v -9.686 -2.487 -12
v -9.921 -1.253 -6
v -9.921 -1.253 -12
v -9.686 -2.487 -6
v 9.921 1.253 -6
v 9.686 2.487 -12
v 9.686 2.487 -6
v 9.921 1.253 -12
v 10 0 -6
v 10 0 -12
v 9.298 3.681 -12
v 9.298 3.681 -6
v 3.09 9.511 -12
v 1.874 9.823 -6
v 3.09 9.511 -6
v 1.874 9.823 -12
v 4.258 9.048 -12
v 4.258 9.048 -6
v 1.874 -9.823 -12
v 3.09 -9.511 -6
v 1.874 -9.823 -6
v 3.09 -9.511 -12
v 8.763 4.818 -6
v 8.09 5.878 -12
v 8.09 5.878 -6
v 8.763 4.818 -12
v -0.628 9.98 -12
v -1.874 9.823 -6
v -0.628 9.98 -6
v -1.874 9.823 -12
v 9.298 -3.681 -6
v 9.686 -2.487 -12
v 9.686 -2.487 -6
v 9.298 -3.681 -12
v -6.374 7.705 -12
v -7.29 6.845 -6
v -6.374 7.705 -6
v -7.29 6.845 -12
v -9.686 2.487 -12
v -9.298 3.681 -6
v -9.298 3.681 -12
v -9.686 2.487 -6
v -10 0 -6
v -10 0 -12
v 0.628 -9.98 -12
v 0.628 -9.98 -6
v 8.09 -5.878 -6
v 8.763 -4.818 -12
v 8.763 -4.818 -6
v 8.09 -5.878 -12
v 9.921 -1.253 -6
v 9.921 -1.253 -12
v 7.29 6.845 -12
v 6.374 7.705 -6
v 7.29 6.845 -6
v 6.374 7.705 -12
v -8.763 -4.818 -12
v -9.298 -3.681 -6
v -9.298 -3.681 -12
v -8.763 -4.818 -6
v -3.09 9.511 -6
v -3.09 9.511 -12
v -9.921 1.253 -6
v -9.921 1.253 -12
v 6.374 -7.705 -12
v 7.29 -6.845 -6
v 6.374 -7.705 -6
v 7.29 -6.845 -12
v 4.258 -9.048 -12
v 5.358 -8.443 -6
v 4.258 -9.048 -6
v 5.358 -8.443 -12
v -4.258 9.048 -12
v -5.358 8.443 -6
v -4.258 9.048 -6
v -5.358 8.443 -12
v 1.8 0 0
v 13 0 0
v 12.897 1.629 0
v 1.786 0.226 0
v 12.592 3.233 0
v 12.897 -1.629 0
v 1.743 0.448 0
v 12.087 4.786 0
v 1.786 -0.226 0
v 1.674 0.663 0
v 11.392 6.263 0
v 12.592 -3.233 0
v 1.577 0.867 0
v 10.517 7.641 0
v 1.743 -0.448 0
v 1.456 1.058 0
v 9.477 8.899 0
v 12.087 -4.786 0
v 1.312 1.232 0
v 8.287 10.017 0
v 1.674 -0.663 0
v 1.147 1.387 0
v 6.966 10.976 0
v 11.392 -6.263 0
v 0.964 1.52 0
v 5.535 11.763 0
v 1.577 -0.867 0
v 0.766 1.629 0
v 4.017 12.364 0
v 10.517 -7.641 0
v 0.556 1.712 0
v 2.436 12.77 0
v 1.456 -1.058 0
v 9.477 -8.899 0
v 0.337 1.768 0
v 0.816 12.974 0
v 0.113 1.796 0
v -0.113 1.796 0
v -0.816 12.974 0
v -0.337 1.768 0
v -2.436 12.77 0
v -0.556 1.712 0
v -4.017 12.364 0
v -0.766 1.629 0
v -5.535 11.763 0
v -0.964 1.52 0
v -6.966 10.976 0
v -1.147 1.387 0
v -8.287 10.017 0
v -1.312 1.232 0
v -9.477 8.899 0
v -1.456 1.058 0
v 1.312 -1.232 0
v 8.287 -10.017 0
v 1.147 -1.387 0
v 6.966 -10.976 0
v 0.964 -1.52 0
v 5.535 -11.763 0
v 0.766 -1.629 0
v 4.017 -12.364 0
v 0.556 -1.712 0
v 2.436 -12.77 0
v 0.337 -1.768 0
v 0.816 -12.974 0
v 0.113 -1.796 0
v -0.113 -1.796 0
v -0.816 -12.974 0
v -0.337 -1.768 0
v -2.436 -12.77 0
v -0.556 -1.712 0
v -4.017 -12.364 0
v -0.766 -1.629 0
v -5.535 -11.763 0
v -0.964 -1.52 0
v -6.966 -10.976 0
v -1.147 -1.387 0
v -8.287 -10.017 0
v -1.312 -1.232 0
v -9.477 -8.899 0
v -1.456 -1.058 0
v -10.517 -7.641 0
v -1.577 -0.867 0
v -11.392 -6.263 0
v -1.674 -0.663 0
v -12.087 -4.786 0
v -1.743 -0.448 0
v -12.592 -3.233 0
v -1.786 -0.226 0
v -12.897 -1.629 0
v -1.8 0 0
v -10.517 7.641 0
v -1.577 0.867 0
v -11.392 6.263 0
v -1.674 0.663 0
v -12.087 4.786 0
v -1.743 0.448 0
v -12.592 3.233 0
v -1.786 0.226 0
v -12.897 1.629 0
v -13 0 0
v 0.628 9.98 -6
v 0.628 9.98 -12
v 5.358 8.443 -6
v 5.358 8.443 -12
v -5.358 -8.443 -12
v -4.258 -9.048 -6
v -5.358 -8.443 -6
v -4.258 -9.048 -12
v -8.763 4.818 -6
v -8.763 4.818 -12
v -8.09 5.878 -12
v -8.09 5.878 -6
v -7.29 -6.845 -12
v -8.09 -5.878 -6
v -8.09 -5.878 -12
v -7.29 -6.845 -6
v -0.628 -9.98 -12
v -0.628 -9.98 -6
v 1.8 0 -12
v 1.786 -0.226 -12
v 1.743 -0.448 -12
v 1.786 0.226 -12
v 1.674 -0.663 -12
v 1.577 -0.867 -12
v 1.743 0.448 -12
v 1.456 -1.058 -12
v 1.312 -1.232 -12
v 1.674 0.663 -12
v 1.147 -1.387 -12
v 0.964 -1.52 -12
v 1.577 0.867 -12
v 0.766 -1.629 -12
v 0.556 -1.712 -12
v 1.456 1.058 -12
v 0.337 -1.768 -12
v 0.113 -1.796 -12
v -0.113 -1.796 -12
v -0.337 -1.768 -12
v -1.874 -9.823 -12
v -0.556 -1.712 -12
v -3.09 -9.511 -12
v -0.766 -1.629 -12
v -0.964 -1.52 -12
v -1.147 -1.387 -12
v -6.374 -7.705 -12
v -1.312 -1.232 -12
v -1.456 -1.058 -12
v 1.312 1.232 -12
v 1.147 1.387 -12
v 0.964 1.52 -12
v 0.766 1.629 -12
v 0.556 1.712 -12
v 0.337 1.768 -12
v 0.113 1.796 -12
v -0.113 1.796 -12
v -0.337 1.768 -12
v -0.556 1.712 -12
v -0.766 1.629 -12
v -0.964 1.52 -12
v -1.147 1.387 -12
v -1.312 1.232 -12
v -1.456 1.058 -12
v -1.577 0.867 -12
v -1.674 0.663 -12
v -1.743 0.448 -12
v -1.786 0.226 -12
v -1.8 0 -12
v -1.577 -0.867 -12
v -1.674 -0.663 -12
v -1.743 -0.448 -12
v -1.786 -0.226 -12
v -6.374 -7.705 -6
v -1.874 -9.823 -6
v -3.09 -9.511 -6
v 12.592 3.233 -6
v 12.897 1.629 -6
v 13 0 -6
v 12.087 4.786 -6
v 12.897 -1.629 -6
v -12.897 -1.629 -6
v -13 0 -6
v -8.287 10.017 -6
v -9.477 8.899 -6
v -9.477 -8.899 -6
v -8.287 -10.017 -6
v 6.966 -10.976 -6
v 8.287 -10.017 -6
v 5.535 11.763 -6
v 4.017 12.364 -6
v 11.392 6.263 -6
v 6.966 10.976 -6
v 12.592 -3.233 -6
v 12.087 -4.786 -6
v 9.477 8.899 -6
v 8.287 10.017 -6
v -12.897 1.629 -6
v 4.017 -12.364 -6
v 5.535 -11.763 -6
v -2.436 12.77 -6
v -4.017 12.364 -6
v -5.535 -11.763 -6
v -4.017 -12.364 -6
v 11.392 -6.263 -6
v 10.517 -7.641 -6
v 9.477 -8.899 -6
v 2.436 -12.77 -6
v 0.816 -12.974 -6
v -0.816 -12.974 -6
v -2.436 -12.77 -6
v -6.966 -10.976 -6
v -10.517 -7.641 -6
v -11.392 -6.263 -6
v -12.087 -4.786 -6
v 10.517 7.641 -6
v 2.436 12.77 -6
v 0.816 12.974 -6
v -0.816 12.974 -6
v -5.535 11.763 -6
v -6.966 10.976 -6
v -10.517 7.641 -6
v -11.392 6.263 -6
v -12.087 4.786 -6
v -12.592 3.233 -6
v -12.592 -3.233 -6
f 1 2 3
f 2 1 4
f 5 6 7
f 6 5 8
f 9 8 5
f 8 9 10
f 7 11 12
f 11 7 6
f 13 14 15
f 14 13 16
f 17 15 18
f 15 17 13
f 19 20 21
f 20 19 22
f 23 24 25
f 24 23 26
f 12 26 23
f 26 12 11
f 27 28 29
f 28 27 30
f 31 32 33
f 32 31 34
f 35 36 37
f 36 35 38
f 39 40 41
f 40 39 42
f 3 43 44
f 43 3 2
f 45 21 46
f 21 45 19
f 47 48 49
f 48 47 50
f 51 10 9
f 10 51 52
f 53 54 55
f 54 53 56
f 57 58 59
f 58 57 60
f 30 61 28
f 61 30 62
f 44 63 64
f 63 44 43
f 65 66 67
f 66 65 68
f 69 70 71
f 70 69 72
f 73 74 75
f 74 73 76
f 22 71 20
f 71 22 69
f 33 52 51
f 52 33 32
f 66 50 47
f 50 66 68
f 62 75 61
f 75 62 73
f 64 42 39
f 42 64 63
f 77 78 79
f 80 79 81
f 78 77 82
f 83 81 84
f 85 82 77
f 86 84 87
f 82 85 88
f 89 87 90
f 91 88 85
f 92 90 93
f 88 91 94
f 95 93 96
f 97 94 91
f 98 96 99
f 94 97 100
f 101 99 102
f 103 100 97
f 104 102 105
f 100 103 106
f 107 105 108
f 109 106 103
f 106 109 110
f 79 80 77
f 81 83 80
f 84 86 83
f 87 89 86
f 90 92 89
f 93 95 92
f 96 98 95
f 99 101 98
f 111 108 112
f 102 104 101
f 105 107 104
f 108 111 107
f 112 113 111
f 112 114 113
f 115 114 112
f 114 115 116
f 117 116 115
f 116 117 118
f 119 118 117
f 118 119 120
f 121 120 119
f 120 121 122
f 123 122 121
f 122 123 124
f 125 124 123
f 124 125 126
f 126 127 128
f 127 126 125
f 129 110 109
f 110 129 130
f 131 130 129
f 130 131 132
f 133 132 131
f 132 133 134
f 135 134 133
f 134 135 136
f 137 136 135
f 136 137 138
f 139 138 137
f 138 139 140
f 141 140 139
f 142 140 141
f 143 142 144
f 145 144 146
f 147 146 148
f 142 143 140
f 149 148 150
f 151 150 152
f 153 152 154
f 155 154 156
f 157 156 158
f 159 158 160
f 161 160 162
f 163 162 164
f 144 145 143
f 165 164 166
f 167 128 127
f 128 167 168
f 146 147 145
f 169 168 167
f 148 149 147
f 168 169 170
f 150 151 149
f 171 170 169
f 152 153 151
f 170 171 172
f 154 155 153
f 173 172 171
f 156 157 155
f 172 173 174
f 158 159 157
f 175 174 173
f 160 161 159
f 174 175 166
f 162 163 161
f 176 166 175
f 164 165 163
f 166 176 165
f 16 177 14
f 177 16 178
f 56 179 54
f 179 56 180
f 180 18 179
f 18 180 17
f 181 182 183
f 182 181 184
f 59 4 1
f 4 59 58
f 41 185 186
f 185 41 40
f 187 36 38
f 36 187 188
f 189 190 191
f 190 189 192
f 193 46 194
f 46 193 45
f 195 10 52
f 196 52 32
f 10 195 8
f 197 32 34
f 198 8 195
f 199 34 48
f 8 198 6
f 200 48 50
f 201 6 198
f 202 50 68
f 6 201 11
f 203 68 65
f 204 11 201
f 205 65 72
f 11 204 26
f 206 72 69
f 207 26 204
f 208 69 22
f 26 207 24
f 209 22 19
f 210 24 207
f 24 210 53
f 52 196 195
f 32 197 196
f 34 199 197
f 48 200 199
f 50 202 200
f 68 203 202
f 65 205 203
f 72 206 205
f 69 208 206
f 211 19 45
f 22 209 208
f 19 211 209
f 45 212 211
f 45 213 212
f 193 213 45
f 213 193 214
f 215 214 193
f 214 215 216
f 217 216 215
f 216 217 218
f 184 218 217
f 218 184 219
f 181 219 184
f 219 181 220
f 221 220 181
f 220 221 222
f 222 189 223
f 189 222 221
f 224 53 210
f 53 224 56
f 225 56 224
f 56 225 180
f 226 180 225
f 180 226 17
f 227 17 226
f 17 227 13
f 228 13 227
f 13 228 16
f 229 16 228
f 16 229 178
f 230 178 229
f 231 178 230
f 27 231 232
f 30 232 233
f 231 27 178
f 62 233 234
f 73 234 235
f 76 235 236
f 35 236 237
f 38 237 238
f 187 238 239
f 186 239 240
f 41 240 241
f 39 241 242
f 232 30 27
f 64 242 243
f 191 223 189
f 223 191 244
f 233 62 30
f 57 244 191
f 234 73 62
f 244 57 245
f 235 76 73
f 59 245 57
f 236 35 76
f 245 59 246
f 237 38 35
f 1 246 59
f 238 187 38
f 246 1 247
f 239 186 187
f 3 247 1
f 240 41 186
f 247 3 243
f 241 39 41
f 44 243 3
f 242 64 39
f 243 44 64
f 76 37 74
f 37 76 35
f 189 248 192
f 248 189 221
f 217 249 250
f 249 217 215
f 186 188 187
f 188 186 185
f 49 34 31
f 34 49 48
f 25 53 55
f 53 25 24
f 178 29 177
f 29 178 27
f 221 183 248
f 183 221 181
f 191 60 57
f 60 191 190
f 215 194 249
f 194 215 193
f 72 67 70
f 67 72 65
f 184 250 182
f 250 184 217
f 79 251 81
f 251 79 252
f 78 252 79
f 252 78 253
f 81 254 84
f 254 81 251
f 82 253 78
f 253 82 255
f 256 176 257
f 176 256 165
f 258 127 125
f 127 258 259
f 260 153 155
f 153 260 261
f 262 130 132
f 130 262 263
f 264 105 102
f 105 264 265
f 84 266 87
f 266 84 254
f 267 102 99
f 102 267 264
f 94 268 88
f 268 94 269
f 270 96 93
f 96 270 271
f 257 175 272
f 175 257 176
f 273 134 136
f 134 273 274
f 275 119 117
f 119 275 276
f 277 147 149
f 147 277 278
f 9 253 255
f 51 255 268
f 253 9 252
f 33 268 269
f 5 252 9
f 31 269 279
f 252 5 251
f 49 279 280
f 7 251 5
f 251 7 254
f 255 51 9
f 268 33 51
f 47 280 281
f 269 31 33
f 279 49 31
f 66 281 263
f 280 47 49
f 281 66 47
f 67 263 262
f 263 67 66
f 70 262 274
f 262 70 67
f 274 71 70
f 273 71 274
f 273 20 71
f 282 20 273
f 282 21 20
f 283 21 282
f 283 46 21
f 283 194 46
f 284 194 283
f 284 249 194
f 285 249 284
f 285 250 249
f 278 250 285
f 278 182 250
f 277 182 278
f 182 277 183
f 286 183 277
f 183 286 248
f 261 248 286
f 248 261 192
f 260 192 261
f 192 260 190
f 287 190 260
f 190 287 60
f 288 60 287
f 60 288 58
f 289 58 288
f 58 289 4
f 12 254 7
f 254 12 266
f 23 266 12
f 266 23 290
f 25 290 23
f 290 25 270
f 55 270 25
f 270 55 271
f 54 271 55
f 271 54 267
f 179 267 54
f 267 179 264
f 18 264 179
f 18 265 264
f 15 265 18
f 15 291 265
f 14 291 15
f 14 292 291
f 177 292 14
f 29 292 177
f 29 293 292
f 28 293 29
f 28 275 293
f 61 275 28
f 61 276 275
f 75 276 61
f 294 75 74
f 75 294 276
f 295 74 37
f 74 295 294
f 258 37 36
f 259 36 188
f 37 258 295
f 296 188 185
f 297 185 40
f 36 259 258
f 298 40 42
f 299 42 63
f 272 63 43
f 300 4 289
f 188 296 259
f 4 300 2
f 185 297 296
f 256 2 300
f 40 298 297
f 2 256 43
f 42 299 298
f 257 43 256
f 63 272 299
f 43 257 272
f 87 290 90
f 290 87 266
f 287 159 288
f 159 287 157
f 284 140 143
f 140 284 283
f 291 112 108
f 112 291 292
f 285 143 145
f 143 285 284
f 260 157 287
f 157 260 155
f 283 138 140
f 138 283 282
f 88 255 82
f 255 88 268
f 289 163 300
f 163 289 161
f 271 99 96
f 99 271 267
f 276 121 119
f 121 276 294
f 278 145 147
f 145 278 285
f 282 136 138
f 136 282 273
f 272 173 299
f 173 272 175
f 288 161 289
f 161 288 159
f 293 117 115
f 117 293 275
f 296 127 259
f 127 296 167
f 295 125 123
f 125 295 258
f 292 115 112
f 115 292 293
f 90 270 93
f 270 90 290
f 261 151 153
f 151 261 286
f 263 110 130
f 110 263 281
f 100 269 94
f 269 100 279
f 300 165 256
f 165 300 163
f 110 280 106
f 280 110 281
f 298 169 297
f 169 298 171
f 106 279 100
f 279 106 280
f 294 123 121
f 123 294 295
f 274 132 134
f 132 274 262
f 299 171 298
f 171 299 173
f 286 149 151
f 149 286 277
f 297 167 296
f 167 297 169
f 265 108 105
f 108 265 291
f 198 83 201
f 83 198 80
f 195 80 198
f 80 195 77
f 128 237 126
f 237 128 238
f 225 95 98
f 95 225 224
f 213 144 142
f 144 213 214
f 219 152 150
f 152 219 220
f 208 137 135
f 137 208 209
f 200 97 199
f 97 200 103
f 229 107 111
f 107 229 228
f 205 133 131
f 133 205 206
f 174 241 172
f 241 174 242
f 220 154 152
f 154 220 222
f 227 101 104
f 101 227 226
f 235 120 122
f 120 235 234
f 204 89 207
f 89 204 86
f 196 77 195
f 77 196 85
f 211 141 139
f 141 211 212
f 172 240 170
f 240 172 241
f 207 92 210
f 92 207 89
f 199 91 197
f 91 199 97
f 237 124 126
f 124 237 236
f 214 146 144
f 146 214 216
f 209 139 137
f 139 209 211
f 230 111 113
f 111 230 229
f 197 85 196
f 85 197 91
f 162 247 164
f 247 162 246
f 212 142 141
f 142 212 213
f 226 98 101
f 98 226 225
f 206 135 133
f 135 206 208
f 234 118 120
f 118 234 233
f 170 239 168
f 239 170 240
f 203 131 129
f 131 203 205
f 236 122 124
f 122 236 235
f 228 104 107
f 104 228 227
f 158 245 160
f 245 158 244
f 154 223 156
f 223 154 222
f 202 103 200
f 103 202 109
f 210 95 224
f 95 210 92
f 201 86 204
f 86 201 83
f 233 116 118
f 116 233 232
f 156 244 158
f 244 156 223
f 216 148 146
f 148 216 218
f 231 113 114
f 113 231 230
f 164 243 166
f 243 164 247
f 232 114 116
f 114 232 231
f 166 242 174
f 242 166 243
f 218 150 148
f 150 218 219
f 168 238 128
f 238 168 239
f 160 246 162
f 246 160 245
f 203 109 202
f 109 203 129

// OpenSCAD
$fn = 50;


difference() {
	union() {
		translate(v = [0, 0, -12.0000000000]) {
			cylinder(h = 12, r = 10.0000000000);
		}
		translate(v = [0, 0, -6.0000000000]) {
			cylinder(h = 6, r = 13.0000000000);
		}
	}
	union() {
		#translate(v = [0, 0, -12]) {
			cylinder(h = 12, r = 1.8000000000);
		}
	}
}
